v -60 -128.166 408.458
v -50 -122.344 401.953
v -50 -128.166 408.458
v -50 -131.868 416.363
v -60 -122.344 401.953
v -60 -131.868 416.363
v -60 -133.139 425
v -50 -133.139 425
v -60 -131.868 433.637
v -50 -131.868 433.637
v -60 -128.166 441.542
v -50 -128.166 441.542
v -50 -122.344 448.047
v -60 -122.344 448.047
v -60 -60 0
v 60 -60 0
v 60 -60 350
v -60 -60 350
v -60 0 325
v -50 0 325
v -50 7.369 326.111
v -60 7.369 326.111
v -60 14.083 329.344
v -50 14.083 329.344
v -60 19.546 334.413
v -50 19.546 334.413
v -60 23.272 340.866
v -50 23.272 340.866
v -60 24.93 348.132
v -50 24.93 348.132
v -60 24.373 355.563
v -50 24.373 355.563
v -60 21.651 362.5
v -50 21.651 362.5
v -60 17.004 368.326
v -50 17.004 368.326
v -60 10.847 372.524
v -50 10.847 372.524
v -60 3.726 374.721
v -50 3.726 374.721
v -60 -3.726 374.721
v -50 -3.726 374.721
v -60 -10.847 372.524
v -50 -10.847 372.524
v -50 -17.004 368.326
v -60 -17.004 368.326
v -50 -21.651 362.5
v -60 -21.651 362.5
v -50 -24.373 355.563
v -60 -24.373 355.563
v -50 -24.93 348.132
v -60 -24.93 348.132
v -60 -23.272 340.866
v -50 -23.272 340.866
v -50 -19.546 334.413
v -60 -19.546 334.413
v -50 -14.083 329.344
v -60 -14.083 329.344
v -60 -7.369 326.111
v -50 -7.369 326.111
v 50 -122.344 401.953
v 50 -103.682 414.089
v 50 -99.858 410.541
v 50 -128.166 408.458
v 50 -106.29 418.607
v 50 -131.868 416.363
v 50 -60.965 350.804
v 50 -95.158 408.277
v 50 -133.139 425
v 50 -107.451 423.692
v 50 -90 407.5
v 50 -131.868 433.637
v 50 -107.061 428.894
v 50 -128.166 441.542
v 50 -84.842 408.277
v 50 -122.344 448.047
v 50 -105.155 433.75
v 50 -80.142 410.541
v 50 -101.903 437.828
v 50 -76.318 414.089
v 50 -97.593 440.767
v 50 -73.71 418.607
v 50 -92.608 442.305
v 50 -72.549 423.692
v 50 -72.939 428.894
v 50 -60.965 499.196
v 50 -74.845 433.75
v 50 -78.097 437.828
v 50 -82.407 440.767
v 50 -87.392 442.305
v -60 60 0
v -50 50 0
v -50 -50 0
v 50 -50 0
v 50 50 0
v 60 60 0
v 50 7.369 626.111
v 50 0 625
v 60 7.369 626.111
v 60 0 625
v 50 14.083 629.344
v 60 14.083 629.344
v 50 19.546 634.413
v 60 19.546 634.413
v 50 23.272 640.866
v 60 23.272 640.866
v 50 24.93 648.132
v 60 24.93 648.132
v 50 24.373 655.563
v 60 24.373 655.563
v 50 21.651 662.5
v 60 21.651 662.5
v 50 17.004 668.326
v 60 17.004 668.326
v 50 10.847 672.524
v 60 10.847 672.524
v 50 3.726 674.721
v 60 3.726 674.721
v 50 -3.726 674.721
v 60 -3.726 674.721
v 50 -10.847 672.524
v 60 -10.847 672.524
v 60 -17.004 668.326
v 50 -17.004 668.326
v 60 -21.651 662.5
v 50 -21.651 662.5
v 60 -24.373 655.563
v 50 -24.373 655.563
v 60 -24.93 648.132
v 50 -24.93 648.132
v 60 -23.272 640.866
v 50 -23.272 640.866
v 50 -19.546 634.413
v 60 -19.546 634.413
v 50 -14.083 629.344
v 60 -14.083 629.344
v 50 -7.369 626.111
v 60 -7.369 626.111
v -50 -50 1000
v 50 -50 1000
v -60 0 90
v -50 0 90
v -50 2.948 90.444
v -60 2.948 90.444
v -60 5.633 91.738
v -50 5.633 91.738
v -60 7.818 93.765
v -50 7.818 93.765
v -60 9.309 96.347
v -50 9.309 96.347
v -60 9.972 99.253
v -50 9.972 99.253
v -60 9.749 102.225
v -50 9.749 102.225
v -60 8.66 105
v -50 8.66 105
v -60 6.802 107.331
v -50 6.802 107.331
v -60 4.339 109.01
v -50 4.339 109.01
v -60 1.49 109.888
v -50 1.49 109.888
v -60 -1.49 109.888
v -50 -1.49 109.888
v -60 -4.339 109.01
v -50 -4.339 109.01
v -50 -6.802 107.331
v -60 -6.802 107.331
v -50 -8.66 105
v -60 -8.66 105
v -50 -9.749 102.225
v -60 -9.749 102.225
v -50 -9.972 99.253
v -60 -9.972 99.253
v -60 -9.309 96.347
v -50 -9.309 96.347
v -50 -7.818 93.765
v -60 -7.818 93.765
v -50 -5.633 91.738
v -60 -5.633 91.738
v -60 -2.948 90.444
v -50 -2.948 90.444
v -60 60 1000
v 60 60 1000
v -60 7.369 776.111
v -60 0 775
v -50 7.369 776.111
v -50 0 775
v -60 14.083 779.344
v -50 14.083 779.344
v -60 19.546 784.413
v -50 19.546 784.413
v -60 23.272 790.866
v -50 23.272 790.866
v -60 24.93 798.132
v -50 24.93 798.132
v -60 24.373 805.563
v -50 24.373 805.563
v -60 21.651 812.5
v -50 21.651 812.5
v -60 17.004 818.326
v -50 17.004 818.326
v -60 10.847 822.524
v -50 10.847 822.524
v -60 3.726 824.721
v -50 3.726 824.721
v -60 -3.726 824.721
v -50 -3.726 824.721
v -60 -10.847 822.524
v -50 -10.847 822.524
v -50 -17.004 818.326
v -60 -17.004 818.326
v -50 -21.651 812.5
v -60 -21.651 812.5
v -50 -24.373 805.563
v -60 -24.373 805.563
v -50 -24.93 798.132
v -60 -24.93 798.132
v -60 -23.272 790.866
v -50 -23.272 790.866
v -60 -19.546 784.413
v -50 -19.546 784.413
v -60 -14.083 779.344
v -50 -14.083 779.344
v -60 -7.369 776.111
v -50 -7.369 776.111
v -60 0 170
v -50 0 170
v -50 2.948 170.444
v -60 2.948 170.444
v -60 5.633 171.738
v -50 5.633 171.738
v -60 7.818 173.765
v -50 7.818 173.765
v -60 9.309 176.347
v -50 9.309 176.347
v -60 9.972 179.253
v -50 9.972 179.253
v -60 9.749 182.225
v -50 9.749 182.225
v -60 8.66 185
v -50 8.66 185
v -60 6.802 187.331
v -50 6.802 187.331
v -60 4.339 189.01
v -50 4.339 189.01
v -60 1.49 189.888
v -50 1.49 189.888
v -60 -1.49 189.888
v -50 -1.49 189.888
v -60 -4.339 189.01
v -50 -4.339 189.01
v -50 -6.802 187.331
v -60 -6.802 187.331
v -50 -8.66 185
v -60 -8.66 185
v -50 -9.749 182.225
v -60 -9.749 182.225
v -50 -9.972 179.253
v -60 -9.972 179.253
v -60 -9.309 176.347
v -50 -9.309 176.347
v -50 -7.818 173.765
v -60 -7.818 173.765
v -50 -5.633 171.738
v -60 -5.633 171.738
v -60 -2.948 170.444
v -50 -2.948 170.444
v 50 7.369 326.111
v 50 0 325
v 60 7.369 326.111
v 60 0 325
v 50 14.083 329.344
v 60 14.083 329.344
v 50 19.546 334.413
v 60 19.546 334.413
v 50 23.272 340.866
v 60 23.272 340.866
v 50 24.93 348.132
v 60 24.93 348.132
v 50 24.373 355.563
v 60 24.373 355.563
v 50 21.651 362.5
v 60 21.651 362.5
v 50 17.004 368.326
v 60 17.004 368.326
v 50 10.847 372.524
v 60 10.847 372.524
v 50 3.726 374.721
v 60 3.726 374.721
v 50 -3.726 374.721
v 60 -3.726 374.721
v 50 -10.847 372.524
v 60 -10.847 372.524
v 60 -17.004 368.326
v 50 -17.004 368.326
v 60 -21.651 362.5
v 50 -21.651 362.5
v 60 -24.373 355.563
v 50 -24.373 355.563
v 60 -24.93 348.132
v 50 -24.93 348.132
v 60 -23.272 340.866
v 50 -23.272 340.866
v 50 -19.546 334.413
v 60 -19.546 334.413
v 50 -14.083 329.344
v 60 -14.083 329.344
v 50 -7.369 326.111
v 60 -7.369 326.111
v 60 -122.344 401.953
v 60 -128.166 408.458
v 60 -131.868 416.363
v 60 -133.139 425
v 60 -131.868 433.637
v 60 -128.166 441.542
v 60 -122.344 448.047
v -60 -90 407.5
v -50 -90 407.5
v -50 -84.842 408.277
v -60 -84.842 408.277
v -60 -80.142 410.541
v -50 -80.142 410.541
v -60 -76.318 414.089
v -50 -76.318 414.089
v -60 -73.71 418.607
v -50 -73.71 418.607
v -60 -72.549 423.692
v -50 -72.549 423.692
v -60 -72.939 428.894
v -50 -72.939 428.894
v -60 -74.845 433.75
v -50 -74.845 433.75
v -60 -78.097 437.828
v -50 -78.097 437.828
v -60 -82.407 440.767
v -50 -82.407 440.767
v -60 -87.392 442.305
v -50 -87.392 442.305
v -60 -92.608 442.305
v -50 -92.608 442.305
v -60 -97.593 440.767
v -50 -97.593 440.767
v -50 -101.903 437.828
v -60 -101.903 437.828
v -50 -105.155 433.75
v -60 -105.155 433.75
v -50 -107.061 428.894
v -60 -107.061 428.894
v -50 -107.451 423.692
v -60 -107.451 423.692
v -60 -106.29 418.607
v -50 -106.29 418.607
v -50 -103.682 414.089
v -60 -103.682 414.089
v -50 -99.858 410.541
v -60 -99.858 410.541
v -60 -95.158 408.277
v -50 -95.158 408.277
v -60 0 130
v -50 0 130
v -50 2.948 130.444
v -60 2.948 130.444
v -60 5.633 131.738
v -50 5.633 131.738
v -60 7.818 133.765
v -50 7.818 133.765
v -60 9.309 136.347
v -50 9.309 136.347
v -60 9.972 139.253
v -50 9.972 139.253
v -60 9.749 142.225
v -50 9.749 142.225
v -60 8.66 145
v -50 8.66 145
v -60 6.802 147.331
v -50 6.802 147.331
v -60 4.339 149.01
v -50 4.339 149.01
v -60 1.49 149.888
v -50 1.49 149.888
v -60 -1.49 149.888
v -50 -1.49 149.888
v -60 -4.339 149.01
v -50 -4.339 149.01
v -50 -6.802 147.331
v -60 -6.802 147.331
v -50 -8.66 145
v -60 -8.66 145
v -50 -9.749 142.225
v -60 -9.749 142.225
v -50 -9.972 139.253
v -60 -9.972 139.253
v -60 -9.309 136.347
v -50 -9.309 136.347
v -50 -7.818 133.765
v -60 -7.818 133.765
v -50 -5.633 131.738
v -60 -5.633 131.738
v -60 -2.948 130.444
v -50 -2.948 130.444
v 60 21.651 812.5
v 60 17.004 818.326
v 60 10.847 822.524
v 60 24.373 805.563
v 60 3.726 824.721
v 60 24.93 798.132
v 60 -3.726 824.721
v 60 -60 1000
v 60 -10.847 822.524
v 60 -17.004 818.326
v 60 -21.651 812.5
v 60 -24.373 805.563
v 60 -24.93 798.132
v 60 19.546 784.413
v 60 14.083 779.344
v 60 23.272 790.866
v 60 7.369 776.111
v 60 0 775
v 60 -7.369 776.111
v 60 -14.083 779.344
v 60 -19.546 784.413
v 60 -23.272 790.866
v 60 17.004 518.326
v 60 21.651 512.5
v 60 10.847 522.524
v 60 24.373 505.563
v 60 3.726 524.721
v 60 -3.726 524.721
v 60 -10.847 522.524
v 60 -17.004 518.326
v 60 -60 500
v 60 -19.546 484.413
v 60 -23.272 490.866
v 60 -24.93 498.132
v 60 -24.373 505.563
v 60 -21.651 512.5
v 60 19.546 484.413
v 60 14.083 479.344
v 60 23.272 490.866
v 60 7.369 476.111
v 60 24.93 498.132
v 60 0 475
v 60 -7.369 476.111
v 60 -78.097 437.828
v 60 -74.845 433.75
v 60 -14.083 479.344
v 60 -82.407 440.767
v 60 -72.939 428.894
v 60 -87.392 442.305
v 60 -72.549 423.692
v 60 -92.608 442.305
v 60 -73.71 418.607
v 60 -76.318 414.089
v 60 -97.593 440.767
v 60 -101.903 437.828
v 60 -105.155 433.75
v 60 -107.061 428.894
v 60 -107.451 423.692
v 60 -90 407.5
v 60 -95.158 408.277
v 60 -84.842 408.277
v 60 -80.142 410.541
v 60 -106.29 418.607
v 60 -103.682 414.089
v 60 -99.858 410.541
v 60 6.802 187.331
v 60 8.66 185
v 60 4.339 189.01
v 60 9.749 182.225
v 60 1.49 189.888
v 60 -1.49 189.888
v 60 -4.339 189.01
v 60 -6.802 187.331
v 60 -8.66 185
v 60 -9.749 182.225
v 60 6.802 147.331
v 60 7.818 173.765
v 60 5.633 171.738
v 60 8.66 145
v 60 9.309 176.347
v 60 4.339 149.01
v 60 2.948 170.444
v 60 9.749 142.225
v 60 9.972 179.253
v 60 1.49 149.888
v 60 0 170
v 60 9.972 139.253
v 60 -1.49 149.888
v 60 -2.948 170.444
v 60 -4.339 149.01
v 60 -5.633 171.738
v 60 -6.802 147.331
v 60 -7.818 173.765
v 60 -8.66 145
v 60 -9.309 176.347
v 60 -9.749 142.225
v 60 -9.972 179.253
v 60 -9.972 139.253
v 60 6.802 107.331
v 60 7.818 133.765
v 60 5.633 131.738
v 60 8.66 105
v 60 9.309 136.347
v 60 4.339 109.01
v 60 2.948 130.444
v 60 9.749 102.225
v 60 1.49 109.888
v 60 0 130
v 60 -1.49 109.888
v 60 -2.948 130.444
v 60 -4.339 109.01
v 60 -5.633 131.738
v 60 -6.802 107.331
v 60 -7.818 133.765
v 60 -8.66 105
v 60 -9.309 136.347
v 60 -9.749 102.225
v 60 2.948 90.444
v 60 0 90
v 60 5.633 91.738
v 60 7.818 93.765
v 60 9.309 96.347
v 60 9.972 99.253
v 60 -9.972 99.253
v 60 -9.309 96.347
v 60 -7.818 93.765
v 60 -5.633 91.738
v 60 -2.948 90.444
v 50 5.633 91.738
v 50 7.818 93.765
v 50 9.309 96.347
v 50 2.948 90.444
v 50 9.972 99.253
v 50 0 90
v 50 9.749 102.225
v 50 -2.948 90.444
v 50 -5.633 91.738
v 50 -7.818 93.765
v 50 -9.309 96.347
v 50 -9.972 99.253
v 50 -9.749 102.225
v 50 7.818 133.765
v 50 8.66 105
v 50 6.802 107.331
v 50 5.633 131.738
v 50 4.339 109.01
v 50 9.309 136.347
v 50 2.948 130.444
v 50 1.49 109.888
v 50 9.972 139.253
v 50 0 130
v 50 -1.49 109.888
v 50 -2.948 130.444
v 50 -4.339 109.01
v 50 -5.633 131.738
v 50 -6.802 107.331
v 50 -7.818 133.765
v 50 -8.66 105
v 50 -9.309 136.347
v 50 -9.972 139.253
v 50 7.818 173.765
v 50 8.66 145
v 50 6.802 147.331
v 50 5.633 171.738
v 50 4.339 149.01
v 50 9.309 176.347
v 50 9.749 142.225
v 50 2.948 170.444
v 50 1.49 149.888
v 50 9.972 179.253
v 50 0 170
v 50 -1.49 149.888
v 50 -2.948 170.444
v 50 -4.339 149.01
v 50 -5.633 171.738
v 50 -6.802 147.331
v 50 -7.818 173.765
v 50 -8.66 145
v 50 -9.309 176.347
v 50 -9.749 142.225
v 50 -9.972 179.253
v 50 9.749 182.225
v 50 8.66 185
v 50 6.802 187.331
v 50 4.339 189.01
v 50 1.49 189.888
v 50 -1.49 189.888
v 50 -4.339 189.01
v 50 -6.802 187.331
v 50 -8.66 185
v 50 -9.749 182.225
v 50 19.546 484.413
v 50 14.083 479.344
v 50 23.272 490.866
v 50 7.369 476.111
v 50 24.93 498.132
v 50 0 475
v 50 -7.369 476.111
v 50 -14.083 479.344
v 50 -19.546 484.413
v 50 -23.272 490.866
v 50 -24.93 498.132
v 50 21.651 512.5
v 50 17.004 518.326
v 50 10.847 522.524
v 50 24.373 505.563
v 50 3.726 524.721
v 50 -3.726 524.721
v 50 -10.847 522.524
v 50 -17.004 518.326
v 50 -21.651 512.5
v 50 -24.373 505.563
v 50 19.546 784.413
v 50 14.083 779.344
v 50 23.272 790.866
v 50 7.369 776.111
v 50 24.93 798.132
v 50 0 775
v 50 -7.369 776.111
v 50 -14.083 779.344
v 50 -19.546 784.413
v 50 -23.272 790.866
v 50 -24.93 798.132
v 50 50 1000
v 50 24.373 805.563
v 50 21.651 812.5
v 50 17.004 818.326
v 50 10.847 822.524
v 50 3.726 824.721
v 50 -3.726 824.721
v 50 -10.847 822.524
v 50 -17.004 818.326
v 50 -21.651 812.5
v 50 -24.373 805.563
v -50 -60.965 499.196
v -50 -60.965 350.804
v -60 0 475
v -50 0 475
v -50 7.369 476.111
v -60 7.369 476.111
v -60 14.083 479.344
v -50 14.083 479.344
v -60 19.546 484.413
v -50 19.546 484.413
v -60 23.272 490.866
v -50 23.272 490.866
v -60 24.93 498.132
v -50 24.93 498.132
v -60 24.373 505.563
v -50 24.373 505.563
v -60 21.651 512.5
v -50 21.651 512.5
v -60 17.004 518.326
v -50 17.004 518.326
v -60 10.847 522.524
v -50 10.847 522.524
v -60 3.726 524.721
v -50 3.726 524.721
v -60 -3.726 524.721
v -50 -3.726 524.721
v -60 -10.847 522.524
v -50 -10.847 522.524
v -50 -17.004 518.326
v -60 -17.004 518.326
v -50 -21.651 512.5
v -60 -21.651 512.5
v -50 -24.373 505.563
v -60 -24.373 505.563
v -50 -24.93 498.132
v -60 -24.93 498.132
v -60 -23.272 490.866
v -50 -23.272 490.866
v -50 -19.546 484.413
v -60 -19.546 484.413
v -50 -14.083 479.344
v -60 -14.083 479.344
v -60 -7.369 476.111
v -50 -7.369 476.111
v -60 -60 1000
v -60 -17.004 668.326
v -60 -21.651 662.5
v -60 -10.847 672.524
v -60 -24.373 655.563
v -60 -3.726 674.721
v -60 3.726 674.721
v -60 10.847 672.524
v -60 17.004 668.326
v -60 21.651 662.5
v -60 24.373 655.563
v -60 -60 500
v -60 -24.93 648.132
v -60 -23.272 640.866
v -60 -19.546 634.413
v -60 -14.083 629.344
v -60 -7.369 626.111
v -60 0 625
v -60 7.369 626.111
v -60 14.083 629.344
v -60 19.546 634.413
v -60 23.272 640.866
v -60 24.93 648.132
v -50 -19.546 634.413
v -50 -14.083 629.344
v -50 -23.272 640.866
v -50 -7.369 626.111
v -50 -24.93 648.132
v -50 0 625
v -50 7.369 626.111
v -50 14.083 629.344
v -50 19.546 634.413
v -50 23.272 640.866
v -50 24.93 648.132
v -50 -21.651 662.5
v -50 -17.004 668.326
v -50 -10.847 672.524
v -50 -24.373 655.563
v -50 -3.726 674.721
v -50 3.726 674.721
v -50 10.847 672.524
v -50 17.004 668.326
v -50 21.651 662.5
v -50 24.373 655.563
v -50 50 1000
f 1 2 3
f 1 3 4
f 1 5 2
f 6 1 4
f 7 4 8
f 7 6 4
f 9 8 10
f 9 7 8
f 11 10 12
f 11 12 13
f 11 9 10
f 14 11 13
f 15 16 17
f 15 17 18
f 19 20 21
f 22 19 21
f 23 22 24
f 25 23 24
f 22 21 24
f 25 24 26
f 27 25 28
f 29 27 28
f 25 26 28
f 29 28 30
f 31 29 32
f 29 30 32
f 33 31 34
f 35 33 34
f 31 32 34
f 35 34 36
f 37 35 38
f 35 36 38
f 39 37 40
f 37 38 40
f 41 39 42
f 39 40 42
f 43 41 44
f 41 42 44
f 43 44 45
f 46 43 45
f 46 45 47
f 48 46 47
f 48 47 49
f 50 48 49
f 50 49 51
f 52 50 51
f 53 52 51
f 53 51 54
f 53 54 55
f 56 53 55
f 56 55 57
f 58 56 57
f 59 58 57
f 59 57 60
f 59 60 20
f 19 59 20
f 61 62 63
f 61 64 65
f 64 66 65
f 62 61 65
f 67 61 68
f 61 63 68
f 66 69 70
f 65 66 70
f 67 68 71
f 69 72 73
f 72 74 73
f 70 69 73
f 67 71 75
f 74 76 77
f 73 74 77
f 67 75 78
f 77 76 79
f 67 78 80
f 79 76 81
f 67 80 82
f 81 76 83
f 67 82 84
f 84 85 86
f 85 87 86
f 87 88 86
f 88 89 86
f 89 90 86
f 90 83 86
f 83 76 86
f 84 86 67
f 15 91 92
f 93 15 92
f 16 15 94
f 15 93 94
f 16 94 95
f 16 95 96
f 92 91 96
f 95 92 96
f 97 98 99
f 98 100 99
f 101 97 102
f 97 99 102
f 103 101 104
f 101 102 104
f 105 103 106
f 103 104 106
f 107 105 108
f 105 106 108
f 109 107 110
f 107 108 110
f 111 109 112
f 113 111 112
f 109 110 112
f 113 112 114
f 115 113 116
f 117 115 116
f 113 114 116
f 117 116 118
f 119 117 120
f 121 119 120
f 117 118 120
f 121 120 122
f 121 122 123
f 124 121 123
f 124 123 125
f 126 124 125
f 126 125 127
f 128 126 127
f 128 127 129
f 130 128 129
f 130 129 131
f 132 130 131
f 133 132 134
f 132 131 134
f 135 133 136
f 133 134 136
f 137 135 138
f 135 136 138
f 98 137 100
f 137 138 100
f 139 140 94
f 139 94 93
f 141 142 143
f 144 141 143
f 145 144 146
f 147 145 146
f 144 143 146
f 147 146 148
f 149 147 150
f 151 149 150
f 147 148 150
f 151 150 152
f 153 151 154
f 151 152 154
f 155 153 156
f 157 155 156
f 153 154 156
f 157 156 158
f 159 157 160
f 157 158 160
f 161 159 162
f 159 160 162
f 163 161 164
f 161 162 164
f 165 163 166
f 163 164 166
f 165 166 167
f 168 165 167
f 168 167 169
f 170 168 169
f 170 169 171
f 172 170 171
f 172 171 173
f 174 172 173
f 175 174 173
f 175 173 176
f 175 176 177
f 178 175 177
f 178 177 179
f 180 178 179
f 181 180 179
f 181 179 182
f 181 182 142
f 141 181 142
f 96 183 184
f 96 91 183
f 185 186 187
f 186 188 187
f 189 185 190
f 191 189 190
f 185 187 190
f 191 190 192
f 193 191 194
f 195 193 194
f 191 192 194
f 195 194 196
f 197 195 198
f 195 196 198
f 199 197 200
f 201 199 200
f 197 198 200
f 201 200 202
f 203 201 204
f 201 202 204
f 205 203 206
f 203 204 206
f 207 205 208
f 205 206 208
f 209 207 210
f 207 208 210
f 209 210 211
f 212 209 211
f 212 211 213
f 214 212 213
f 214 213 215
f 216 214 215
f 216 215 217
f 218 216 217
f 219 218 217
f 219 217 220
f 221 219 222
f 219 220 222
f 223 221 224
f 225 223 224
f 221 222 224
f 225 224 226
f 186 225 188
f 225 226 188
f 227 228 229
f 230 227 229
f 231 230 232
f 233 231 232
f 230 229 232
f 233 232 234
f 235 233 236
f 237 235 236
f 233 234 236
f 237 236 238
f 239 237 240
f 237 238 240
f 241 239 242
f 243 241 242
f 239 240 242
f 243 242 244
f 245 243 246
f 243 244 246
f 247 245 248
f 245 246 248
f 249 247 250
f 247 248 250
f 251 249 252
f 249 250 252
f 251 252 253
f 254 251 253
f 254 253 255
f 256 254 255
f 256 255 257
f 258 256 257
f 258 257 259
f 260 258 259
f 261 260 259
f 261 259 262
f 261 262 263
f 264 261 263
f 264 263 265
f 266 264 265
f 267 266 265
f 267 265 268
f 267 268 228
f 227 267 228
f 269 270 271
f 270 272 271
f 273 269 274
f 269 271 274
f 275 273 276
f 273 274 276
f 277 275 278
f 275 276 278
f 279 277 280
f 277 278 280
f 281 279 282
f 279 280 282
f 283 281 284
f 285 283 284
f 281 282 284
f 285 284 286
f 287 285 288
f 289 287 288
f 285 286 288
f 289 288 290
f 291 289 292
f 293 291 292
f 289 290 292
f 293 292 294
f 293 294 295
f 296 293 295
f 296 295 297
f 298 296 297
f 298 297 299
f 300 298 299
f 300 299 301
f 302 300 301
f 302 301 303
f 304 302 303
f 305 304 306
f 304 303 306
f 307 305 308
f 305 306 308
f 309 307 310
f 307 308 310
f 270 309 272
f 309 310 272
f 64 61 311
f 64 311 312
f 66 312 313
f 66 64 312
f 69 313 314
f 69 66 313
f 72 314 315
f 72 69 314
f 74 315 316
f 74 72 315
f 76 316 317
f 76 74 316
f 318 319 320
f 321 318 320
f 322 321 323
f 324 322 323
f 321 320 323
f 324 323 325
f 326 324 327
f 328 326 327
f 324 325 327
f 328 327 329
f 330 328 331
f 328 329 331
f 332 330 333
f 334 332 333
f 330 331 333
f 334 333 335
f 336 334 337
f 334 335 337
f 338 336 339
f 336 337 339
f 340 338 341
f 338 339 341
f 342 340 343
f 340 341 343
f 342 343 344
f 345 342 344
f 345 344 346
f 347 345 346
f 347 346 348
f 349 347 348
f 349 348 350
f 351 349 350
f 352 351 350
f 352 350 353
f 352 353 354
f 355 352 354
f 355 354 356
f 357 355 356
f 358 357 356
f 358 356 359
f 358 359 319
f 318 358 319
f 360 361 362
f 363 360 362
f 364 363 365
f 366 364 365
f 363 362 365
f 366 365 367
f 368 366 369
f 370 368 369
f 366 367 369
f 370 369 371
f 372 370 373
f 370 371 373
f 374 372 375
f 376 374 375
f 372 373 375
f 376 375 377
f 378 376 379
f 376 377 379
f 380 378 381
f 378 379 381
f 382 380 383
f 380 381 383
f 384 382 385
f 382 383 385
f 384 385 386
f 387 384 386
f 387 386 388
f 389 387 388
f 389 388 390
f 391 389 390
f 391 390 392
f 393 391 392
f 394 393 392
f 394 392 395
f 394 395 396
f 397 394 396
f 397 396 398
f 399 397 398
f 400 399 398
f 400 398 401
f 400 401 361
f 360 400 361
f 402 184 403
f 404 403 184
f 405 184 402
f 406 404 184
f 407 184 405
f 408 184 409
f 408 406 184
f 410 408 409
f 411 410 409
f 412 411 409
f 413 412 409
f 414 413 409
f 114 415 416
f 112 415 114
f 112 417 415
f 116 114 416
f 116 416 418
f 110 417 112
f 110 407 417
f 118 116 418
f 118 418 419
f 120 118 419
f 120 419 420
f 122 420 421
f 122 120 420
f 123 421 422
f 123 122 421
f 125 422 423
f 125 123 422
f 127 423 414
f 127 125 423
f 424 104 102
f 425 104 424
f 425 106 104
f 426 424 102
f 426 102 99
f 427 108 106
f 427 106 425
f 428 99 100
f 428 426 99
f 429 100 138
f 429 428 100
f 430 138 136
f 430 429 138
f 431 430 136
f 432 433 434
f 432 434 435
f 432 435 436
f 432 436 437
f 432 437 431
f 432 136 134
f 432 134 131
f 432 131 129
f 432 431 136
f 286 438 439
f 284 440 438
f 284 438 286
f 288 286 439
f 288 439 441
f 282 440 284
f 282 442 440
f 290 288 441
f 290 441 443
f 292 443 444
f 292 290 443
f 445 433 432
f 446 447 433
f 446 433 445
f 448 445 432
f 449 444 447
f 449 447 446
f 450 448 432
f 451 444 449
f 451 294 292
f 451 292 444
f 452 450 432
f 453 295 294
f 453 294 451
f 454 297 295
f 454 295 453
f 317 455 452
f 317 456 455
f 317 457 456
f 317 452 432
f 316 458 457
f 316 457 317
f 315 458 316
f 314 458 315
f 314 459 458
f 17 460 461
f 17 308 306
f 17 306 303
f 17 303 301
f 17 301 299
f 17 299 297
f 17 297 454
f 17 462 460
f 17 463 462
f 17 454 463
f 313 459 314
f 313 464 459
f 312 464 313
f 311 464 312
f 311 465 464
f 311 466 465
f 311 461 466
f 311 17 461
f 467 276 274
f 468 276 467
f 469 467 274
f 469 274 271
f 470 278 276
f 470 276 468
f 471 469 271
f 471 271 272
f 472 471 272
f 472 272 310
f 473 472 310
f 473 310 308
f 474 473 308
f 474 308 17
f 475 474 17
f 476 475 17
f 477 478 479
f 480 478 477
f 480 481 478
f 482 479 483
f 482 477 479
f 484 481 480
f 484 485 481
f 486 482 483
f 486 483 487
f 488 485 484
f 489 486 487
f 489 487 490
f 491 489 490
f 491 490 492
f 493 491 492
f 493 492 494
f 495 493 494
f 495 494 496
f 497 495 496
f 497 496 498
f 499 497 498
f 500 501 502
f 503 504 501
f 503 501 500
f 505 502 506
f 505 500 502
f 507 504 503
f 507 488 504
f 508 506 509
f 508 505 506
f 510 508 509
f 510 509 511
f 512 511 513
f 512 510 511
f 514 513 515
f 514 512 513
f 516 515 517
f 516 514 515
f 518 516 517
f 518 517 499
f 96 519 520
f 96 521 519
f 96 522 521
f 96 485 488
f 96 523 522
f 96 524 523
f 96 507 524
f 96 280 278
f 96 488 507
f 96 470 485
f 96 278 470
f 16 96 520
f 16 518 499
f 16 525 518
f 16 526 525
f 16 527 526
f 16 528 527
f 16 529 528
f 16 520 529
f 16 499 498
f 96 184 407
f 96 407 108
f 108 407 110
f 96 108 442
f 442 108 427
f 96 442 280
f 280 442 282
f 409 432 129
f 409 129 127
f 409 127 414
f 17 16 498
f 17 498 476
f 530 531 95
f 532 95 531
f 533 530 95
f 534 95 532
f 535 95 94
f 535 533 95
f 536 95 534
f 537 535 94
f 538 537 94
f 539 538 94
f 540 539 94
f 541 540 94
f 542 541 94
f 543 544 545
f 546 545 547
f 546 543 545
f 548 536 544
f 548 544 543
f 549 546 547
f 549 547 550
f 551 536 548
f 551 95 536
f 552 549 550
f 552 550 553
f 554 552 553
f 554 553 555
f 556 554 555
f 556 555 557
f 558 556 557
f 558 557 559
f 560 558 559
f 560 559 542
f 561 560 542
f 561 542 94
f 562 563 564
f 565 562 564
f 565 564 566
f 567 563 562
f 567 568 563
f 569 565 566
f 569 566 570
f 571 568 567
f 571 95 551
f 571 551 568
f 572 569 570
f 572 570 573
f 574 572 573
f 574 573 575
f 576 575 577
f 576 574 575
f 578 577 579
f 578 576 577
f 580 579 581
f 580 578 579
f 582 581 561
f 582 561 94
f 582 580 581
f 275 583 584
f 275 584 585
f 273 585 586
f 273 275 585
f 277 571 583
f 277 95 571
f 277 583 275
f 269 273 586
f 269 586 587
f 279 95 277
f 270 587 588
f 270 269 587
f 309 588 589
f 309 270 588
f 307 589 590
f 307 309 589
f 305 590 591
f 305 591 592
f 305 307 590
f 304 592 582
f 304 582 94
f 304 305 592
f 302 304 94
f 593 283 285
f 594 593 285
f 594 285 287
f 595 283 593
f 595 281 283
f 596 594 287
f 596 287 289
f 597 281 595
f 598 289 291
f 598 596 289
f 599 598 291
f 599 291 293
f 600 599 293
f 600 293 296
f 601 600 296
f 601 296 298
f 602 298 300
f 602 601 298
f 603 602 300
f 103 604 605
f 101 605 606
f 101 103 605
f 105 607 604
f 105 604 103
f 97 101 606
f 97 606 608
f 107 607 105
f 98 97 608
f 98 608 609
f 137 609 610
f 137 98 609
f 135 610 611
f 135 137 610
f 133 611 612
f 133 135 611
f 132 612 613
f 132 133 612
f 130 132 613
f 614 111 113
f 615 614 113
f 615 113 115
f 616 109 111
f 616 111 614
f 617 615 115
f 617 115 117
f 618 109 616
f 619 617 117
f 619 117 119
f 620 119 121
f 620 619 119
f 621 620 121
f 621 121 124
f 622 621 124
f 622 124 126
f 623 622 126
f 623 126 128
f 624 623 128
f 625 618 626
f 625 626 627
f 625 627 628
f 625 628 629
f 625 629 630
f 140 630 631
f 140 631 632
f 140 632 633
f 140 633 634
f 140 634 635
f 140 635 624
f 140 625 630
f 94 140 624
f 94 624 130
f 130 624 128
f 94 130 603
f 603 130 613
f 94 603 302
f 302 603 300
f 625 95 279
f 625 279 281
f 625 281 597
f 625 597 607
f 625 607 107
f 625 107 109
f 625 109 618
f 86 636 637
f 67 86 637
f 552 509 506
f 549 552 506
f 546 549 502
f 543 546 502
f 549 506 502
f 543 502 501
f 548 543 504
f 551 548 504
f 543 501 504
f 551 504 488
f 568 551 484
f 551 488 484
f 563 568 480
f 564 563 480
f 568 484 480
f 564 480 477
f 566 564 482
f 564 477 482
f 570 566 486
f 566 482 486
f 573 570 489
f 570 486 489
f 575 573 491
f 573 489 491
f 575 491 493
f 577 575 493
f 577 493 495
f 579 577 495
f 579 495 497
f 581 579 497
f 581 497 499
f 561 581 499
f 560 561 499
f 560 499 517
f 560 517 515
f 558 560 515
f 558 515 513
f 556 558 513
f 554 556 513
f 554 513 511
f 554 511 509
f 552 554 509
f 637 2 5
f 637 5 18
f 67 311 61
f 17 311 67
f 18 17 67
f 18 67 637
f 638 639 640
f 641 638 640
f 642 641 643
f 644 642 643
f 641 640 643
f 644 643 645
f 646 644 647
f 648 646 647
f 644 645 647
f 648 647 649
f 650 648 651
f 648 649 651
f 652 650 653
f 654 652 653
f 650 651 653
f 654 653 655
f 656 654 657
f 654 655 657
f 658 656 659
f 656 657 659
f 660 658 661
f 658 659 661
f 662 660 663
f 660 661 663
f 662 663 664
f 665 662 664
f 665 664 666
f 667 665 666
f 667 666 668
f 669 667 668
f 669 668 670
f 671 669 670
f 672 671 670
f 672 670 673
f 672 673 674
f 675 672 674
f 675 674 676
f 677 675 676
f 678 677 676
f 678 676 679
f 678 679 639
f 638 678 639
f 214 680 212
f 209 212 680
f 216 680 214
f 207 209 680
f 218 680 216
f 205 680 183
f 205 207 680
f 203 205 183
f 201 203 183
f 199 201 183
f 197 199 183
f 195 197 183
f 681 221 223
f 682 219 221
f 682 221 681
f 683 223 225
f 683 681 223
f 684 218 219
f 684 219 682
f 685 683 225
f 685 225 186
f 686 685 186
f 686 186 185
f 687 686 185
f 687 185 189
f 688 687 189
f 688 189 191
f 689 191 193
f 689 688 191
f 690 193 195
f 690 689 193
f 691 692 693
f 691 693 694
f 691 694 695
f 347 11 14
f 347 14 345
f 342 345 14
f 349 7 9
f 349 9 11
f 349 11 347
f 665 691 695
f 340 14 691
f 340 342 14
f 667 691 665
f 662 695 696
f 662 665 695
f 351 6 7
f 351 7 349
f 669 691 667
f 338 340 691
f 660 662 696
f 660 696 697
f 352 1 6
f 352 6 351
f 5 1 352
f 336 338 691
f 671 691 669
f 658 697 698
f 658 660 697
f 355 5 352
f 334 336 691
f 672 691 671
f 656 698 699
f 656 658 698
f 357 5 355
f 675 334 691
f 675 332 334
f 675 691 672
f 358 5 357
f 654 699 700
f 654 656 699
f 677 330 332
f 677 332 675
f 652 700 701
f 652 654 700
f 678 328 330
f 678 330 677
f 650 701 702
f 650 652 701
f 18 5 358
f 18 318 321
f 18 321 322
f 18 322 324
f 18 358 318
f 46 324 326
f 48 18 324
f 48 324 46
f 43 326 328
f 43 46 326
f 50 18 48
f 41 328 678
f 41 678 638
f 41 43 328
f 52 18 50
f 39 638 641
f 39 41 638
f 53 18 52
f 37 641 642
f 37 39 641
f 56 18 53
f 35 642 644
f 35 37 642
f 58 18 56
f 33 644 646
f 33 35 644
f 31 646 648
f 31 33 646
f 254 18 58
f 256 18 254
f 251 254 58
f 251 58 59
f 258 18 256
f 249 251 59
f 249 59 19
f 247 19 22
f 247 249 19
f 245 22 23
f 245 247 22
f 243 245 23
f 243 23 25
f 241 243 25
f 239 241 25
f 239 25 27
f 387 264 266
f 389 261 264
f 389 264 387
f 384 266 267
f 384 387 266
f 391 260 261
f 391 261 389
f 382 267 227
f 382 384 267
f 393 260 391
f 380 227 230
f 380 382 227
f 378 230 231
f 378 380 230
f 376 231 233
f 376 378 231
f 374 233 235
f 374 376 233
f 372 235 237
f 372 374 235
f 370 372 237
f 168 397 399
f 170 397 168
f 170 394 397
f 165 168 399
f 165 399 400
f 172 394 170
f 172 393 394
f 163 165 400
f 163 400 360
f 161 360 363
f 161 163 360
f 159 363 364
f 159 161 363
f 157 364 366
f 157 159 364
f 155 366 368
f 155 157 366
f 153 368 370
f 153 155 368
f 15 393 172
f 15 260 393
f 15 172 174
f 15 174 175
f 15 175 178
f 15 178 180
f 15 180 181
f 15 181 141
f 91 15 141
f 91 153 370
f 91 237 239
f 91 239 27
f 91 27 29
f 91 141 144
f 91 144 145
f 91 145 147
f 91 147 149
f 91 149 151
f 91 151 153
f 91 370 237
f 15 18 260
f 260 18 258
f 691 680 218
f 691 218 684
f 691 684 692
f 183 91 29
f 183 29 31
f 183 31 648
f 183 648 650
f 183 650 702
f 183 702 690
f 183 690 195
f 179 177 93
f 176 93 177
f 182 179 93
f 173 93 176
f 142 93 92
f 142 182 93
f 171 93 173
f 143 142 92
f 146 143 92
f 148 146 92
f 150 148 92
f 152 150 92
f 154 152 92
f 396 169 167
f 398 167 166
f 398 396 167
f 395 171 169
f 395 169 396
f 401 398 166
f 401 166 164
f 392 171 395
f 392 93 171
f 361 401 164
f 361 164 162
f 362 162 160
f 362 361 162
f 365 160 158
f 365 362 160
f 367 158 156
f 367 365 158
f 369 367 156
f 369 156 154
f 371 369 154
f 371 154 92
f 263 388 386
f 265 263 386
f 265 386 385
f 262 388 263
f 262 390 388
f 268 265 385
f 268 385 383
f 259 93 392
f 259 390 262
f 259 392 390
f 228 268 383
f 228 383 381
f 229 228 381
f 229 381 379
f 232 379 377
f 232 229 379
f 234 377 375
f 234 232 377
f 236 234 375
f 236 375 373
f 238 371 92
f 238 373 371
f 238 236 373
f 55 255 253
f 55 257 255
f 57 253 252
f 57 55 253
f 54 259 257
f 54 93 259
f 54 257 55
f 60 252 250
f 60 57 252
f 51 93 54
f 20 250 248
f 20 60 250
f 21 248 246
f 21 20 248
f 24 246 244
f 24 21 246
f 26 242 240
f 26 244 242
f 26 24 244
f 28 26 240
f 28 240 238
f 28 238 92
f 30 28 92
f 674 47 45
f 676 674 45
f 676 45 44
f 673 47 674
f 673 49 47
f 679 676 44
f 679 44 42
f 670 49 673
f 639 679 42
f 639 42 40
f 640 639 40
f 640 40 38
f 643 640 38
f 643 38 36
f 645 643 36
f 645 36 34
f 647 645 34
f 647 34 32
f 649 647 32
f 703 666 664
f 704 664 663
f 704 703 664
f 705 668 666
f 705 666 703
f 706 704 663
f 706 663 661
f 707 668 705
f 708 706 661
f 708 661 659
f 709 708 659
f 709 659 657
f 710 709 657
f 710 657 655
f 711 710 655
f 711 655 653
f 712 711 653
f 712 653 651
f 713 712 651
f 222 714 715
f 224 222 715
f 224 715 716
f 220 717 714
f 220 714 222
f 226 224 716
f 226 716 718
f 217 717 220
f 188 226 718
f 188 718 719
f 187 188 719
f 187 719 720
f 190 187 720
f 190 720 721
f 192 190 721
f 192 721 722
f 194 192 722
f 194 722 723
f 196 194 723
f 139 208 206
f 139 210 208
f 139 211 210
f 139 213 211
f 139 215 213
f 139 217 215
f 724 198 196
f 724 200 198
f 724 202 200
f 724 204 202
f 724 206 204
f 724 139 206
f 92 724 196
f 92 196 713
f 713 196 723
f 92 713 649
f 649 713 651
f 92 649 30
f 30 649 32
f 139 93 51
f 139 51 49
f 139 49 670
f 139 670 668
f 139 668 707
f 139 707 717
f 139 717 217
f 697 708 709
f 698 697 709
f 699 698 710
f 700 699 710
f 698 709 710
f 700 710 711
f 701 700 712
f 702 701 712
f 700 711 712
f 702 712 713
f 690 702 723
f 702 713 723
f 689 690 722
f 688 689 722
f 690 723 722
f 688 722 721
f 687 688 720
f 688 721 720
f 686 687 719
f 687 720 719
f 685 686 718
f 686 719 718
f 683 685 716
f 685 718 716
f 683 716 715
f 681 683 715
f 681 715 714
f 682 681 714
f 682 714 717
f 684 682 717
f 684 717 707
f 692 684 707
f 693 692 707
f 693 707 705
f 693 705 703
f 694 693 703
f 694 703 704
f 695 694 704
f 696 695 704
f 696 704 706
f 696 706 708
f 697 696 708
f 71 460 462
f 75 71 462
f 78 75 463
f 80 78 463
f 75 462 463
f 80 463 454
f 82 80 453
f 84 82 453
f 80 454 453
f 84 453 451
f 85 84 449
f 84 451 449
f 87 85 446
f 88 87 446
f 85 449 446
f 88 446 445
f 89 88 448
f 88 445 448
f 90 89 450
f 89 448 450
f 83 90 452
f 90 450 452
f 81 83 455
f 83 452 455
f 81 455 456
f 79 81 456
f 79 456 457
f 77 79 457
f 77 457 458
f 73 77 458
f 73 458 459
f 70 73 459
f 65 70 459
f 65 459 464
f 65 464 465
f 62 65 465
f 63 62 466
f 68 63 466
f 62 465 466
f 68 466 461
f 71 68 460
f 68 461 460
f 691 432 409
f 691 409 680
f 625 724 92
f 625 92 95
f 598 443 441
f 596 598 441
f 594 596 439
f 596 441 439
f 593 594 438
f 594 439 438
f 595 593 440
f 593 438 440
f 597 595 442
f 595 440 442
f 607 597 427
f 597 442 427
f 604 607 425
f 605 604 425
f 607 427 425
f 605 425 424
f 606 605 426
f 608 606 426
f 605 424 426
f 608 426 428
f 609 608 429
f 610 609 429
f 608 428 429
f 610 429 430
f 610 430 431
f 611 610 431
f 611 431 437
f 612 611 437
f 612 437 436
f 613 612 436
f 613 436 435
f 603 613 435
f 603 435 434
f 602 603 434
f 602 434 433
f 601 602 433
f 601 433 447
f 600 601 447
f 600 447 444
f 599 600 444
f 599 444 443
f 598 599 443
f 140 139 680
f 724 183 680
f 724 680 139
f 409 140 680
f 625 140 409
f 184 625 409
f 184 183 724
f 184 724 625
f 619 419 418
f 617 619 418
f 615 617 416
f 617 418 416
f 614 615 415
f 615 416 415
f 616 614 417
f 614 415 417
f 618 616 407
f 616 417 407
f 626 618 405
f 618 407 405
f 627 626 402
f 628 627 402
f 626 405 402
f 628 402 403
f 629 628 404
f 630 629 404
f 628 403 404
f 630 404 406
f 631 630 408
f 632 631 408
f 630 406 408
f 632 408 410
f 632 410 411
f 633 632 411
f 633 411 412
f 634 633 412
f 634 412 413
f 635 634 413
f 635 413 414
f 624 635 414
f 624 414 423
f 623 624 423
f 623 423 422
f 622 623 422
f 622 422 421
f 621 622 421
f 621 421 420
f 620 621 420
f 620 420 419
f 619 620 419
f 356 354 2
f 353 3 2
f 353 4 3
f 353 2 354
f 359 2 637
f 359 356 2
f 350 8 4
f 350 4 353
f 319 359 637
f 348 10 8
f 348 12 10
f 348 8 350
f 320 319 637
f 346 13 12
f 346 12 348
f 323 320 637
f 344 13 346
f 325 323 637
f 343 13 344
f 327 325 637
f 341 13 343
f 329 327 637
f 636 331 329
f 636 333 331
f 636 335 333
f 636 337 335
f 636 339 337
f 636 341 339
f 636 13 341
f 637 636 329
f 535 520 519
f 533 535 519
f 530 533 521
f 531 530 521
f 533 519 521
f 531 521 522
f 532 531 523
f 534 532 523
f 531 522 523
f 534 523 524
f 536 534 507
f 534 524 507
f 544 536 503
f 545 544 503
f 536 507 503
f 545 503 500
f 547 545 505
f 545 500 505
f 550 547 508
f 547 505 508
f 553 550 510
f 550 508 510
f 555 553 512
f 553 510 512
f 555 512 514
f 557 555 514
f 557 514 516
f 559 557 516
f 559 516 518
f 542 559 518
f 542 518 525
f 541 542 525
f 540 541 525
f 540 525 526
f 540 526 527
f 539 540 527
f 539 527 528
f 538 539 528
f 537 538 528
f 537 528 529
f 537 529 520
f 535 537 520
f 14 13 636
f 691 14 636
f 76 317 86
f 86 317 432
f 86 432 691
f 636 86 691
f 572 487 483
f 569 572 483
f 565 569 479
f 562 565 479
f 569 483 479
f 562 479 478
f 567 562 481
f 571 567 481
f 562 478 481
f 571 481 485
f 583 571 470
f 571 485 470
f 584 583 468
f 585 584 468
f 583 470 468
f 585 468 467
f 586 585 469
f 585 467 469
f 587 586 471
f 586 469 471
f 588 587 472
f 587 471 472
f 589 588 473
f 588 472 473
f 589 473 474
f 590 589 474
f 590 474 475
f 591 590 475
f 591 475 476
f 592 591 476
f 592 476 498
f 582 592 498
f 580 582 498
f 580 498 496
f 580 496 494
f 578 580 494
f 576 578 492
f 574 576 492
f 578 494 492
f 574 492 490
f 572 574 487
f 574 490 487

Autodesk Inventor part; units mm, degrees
ref_plane "YZ Plane" through (0, 0, 0) normal (1, 0, 0) x (0, 1, 0)
ref_plane "XZ Plane" through (0, 0, 0) normal (0, 1, 0) x (-1, 0, 0)
ref_plane "XY Plane" through (0, 0, 0) normal (0, 0, 1) x (1, 0, 0)
sketch "Sketch1" plane through (0, 0, 0) normal (0, 0, 1) x (1, 0, 0)
  line L0 (-60, 60) -> (60, 60)
  line L1 (60, 60) -> (60, -60)
  line L2 (60, -60) -> (-60, -60)
  line L3 (-60, -60) -> (-60, 60)
  line L4 (-60, 60) -> (60, -60) construction
  line L5 (60, 60) -> (-60, -60) construction
  point P0 (0, 0)
  dimension "d0" = 120
  dimension "d1" = 120
extrude "Extrusion1" add sketch "Sketch1" along normal blind 1000
sketch "Sketch2" plane through (0, 0, 1000) normal (0, 0, 1) x (1, 0, 0)
  line L0 (-50, 50) -> (50, 50)
  line L1 (50, 50) -> (50, -50)
  line L2 (50, -50) -> (-50, -50)
  line L3 (-50, -50) -> (-50, 50)
  line L4 (-50, 50) -> (50, -50) construction
  line L5 (50, 50) -> (-50, -50) construction
  point P0 (0, 0)
  dimension "d4" = 100
  dimension "d5" = 100
extrude "Extrusion2" cut sketch "Sketch2" against normal blind 1000
sketch "Sketch3" plane through (60, -60, 0) normal (1, 0, 0) x (0, 0, -1)
  line L0 (0, 0) -> (-1000, 0) projected
  line L1 (-1072.8828, 120) -> (-1072.8828, 60)
  line L2 (-1072.8828, 60) -> (45.9524, 60)
  circle A0 centre (-800, 60) radius 25
  line L3 (-1000, 120) -> (-1072.8828, 120)
  line L4 (-1000, 120) -> (-1000, 166.4974)
  line L5 (-800, 60) -> (-800, 166.4974)
  line L6 (-650, 60) -> (-650, 175.0662)
  line L7 (-500, 60) -> (-500, 175.0662)
  circle A1 centre (-650, 60) radius 25
  circle A2 centre (-500, 60) radius 25
  line L8 (-350, 60) -> (-350, 191.0617)
  circle A3 centre (-350, 60) radius 25
  point P0 (0, 60)
  dimension "d9" = 50
  dimension "d10" = 60
  dimension "d12" = 200
  dimension "d13" = 150
  dimension "d14" = 150
  dimension "d15" = 50
  dimension "d16" = 50
  dimension "d17" = 150
  dimension "d18" = 50
extrude "Extrusion3" cut sketch "Sketch3" against normal blind 1000
sketch "Sketch4" plane through (60, -60, 0) normal (1, 0, 0) x (0, 0, -1)
  line L0 (0, 0) -> (-1000, 0) projected
  line L1 (-1000, -138.0957) -> (-425, -138.0957)
  line L2 (-425, -90) -> (-500, 0)
  line L3 (-425, -90) -> (-350, 0)
  point P0 (0, 60)
  dimension "d21" = 575
extrude "Extrusion4" add sketch "Sketch4" against normal blind 120
fillet "Fillet1" radius 30 1 edges at (0, -150, 425)
sketch "Sketch5" plane through (60, -60, 0) normal (1, 0, 0) x (0, 0, -1)
  line L0 (-500, 0) -> (-1000, 0) projected
  circle A0 centre (-425, -30) radius 17.5
  line L1 (-425, -6.2892) -> (-425, -12.5)
  point P0 (0, 60)
extrude "Extrusion5" cut sketch "Sketch5" against normal blind 120
sketch "Sketch11" plane through (0, 0, 0) normal (1, 0, 0) x (0, 1, 0)
  line L0 (0, 0) -> (-191.3129, 0)
  line L1 (-191.3129, 0) -> (-191.3129, 1000)
  line L2 (-340.1694, 1000) -> (-340.1694, 500)
  line L3 (-340.1694, 500) -> (94.4413, 500)
  line L4 (-60.9651, 500) -> (-60.9651, 425)
  line L5 (-150.9651, 425) -> (-60.9651, 500)
  line L6 (-60.9651, 425) -> (-60.9651, 350)
  line L7 (-60.9651, 350) -> (-150.9651, 425)
  dimension "d33" = 1000
  dimension "d35" = 500
extrude "Extrusion6" cut sketch "Sketch11" along normal mid plane 100
sketch "Sketch12" plane through (60, -60, 0) normal (1, 0, 0) x (0, 0, -1)
  circle A0 centre (-100, 60) radius 10
  circle A1 centre (-140, 60) radius 10
  circle A2 centre (-180, 60) radius 10
  point P0 (0, 60)
  dimension "d41" = 20
  dimension "d42" = 20
  dimension "d43" = 20
  dimension "d44" = 40
  dimension "d45" = 40
  dimension "d46" = 100
extrude "Extrusion7" cut sketch "Sketch12" against normal blind 599.25
properties part number "atas 1"
